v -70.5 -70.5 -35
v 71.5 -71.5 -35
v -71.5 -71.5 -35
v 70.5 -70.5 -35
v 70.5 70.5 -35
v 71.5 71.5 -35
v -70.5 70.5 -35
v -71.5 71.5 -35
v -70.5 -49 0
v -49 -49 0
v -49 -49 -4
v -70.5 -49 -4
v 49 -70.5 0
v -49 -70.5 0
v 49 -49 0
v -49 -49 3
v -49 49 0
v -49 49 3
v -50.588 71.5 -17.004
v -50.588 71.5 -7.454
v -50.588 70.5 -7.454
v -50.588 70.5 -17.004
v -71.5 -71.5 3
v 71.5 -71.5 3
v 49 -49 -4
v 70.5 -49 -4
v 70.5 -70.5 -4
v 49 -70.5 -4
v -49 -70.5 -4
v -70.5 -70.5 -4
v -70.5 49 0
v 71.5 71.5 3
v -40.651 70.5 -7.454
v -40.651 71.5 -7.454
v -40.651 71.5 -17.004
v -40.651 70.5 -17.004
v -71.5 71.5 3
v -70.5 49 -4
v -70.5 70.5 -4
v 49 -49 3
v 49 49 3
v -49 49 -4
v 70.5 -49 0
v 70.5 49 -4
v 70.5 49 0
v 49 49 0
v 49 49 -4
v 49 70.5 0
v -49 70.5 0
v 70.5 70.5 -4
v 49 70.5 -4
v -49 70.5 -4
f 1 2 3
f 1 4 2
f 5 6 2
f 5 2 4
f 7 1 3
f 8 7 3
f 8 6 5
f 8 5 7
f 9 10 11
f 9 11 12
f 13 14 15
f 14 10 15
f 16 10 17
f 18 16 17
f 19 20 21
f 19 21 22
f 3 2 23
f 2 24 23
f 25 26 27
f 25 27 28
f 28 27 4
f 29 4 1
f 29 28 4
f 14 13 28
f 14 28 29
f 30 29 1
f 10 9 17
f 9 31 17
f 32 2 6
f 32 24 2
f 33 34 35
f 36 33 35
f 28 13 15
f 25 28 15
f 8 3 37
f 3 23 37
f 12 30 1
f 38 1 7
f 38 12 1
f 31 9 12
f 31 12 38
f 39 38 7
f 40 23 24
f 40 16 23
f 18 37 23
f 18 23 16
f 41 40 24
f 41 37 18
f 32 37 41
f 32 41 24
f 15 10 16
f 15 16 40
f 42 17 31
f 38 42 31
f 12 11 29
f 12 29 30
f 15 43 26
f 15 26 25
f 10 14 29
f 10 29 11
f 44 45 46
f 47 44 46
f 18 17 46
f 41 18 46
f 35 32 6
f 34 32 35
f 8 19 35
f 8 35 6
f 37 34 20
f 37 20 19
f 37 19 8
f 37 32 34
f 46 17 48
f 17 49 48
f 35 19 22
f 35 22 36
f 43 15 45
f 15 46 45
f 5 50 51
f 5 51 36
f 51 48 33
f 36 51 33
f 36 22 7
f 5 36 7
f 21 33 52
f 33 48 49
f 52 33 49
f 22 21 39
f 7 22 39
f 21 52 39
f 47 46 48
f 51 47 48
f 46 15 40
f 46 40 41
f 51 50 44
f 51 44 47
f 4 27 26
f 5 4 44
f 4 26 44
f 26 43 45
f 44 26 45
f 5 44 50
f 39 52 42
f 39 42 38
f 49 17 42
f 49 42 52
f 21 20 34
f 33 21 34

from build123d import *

# Parameters (mm, degrees)
SKETCH1_W           = 143
SKETCH1_H           = 143
SKETCH1_W_2         = 98
SKETCH1_H_2         = 98
BOSS_EXTRUDE1_DEPTH = 3
SKETCH2_W           = 143
SKETCH2_H           = 143
SKETCH2_W_2         = 141
SKETCH2_H_2         = 141
BOSS_EXTRUDE2_DEPTH = 35
SKETCH3_W           = 21.5
SKETCH3_H           = 21.5
BOSS_EXTRUDE3_DEPTH = 4
SKETCH4_W           = 9.937019223
SKETCH4_H           = 9.54986263
CUT_EXTRUDE1_DEPTH  = 4


with BuildPart() as part:
    # Sketch1 → Boss-Extrude1 (new body)
    with BuildSketch(Plane.XY):
        Rectangle(SKETCH1_W, SKETCH1_H)
        Rectangle(SKETCH1_W_2, SKETCH1_H_2, mode=Mode.SUBTRACT)
    extrude(amount=BOSS_EXTRUDE1_DEPTH)

    # Sketch2 → Boss-Extrude2 (add)
    with BuildSketch(Plane(origin=(0, 0, 0), x_dir=(-1, 0, 0), z_dir=(0, 0, -1))):
        Rectangle(SKETCH2_W, SKETCH2_H)
        Rectangle(SKETCH2_W_2, SKETCH2_H_2, mode=Mode.SUBTRACT)
    extrude(amount=BOSS_EXTRUDE2_DEPTH)

    # Sketch3 → Boss-Extrude3 (add)
    with BuildSketch(Plane(origin=(0, 0, 0), x_dir=(-1, 0, 0), z_dir=(0, 0, -1))):
        with Locations((-59.75, 59.75)):
            Rectangle(SKETCH3_W, SKETCH3_H)
        with Locations((-59.75, -59.75)):
            Rectangle(SKETCH3_W, SKETCH3_H)
        with Locations((59.75, -59.75)):
            Rectangle(SKETCH3_W, SKETCH3_H)
        with Locations((59.75, 59.75)):
            Rectangle(SKETCH3_W, SKETCH3_H)
    extrude(amount=BOSS_EXTRUDE3_DEPTH)

    # Sketch4 → Cut-Extrude1 (cut)
    with BuildSketch(Plane(origin=(0, 71.5, 0), x_dir=(1, 0, 0), z_dir=(0, 1, 0))):
        with Locations((-45.619951888, 12.228924985)):
            Rectangle(SKETCH4_W, SKETCH4_H)
    extrude(amount=-CUT_EXTRUDE1_DEPTH, mode=Mode.SUBTRACT)


solid = part.part
